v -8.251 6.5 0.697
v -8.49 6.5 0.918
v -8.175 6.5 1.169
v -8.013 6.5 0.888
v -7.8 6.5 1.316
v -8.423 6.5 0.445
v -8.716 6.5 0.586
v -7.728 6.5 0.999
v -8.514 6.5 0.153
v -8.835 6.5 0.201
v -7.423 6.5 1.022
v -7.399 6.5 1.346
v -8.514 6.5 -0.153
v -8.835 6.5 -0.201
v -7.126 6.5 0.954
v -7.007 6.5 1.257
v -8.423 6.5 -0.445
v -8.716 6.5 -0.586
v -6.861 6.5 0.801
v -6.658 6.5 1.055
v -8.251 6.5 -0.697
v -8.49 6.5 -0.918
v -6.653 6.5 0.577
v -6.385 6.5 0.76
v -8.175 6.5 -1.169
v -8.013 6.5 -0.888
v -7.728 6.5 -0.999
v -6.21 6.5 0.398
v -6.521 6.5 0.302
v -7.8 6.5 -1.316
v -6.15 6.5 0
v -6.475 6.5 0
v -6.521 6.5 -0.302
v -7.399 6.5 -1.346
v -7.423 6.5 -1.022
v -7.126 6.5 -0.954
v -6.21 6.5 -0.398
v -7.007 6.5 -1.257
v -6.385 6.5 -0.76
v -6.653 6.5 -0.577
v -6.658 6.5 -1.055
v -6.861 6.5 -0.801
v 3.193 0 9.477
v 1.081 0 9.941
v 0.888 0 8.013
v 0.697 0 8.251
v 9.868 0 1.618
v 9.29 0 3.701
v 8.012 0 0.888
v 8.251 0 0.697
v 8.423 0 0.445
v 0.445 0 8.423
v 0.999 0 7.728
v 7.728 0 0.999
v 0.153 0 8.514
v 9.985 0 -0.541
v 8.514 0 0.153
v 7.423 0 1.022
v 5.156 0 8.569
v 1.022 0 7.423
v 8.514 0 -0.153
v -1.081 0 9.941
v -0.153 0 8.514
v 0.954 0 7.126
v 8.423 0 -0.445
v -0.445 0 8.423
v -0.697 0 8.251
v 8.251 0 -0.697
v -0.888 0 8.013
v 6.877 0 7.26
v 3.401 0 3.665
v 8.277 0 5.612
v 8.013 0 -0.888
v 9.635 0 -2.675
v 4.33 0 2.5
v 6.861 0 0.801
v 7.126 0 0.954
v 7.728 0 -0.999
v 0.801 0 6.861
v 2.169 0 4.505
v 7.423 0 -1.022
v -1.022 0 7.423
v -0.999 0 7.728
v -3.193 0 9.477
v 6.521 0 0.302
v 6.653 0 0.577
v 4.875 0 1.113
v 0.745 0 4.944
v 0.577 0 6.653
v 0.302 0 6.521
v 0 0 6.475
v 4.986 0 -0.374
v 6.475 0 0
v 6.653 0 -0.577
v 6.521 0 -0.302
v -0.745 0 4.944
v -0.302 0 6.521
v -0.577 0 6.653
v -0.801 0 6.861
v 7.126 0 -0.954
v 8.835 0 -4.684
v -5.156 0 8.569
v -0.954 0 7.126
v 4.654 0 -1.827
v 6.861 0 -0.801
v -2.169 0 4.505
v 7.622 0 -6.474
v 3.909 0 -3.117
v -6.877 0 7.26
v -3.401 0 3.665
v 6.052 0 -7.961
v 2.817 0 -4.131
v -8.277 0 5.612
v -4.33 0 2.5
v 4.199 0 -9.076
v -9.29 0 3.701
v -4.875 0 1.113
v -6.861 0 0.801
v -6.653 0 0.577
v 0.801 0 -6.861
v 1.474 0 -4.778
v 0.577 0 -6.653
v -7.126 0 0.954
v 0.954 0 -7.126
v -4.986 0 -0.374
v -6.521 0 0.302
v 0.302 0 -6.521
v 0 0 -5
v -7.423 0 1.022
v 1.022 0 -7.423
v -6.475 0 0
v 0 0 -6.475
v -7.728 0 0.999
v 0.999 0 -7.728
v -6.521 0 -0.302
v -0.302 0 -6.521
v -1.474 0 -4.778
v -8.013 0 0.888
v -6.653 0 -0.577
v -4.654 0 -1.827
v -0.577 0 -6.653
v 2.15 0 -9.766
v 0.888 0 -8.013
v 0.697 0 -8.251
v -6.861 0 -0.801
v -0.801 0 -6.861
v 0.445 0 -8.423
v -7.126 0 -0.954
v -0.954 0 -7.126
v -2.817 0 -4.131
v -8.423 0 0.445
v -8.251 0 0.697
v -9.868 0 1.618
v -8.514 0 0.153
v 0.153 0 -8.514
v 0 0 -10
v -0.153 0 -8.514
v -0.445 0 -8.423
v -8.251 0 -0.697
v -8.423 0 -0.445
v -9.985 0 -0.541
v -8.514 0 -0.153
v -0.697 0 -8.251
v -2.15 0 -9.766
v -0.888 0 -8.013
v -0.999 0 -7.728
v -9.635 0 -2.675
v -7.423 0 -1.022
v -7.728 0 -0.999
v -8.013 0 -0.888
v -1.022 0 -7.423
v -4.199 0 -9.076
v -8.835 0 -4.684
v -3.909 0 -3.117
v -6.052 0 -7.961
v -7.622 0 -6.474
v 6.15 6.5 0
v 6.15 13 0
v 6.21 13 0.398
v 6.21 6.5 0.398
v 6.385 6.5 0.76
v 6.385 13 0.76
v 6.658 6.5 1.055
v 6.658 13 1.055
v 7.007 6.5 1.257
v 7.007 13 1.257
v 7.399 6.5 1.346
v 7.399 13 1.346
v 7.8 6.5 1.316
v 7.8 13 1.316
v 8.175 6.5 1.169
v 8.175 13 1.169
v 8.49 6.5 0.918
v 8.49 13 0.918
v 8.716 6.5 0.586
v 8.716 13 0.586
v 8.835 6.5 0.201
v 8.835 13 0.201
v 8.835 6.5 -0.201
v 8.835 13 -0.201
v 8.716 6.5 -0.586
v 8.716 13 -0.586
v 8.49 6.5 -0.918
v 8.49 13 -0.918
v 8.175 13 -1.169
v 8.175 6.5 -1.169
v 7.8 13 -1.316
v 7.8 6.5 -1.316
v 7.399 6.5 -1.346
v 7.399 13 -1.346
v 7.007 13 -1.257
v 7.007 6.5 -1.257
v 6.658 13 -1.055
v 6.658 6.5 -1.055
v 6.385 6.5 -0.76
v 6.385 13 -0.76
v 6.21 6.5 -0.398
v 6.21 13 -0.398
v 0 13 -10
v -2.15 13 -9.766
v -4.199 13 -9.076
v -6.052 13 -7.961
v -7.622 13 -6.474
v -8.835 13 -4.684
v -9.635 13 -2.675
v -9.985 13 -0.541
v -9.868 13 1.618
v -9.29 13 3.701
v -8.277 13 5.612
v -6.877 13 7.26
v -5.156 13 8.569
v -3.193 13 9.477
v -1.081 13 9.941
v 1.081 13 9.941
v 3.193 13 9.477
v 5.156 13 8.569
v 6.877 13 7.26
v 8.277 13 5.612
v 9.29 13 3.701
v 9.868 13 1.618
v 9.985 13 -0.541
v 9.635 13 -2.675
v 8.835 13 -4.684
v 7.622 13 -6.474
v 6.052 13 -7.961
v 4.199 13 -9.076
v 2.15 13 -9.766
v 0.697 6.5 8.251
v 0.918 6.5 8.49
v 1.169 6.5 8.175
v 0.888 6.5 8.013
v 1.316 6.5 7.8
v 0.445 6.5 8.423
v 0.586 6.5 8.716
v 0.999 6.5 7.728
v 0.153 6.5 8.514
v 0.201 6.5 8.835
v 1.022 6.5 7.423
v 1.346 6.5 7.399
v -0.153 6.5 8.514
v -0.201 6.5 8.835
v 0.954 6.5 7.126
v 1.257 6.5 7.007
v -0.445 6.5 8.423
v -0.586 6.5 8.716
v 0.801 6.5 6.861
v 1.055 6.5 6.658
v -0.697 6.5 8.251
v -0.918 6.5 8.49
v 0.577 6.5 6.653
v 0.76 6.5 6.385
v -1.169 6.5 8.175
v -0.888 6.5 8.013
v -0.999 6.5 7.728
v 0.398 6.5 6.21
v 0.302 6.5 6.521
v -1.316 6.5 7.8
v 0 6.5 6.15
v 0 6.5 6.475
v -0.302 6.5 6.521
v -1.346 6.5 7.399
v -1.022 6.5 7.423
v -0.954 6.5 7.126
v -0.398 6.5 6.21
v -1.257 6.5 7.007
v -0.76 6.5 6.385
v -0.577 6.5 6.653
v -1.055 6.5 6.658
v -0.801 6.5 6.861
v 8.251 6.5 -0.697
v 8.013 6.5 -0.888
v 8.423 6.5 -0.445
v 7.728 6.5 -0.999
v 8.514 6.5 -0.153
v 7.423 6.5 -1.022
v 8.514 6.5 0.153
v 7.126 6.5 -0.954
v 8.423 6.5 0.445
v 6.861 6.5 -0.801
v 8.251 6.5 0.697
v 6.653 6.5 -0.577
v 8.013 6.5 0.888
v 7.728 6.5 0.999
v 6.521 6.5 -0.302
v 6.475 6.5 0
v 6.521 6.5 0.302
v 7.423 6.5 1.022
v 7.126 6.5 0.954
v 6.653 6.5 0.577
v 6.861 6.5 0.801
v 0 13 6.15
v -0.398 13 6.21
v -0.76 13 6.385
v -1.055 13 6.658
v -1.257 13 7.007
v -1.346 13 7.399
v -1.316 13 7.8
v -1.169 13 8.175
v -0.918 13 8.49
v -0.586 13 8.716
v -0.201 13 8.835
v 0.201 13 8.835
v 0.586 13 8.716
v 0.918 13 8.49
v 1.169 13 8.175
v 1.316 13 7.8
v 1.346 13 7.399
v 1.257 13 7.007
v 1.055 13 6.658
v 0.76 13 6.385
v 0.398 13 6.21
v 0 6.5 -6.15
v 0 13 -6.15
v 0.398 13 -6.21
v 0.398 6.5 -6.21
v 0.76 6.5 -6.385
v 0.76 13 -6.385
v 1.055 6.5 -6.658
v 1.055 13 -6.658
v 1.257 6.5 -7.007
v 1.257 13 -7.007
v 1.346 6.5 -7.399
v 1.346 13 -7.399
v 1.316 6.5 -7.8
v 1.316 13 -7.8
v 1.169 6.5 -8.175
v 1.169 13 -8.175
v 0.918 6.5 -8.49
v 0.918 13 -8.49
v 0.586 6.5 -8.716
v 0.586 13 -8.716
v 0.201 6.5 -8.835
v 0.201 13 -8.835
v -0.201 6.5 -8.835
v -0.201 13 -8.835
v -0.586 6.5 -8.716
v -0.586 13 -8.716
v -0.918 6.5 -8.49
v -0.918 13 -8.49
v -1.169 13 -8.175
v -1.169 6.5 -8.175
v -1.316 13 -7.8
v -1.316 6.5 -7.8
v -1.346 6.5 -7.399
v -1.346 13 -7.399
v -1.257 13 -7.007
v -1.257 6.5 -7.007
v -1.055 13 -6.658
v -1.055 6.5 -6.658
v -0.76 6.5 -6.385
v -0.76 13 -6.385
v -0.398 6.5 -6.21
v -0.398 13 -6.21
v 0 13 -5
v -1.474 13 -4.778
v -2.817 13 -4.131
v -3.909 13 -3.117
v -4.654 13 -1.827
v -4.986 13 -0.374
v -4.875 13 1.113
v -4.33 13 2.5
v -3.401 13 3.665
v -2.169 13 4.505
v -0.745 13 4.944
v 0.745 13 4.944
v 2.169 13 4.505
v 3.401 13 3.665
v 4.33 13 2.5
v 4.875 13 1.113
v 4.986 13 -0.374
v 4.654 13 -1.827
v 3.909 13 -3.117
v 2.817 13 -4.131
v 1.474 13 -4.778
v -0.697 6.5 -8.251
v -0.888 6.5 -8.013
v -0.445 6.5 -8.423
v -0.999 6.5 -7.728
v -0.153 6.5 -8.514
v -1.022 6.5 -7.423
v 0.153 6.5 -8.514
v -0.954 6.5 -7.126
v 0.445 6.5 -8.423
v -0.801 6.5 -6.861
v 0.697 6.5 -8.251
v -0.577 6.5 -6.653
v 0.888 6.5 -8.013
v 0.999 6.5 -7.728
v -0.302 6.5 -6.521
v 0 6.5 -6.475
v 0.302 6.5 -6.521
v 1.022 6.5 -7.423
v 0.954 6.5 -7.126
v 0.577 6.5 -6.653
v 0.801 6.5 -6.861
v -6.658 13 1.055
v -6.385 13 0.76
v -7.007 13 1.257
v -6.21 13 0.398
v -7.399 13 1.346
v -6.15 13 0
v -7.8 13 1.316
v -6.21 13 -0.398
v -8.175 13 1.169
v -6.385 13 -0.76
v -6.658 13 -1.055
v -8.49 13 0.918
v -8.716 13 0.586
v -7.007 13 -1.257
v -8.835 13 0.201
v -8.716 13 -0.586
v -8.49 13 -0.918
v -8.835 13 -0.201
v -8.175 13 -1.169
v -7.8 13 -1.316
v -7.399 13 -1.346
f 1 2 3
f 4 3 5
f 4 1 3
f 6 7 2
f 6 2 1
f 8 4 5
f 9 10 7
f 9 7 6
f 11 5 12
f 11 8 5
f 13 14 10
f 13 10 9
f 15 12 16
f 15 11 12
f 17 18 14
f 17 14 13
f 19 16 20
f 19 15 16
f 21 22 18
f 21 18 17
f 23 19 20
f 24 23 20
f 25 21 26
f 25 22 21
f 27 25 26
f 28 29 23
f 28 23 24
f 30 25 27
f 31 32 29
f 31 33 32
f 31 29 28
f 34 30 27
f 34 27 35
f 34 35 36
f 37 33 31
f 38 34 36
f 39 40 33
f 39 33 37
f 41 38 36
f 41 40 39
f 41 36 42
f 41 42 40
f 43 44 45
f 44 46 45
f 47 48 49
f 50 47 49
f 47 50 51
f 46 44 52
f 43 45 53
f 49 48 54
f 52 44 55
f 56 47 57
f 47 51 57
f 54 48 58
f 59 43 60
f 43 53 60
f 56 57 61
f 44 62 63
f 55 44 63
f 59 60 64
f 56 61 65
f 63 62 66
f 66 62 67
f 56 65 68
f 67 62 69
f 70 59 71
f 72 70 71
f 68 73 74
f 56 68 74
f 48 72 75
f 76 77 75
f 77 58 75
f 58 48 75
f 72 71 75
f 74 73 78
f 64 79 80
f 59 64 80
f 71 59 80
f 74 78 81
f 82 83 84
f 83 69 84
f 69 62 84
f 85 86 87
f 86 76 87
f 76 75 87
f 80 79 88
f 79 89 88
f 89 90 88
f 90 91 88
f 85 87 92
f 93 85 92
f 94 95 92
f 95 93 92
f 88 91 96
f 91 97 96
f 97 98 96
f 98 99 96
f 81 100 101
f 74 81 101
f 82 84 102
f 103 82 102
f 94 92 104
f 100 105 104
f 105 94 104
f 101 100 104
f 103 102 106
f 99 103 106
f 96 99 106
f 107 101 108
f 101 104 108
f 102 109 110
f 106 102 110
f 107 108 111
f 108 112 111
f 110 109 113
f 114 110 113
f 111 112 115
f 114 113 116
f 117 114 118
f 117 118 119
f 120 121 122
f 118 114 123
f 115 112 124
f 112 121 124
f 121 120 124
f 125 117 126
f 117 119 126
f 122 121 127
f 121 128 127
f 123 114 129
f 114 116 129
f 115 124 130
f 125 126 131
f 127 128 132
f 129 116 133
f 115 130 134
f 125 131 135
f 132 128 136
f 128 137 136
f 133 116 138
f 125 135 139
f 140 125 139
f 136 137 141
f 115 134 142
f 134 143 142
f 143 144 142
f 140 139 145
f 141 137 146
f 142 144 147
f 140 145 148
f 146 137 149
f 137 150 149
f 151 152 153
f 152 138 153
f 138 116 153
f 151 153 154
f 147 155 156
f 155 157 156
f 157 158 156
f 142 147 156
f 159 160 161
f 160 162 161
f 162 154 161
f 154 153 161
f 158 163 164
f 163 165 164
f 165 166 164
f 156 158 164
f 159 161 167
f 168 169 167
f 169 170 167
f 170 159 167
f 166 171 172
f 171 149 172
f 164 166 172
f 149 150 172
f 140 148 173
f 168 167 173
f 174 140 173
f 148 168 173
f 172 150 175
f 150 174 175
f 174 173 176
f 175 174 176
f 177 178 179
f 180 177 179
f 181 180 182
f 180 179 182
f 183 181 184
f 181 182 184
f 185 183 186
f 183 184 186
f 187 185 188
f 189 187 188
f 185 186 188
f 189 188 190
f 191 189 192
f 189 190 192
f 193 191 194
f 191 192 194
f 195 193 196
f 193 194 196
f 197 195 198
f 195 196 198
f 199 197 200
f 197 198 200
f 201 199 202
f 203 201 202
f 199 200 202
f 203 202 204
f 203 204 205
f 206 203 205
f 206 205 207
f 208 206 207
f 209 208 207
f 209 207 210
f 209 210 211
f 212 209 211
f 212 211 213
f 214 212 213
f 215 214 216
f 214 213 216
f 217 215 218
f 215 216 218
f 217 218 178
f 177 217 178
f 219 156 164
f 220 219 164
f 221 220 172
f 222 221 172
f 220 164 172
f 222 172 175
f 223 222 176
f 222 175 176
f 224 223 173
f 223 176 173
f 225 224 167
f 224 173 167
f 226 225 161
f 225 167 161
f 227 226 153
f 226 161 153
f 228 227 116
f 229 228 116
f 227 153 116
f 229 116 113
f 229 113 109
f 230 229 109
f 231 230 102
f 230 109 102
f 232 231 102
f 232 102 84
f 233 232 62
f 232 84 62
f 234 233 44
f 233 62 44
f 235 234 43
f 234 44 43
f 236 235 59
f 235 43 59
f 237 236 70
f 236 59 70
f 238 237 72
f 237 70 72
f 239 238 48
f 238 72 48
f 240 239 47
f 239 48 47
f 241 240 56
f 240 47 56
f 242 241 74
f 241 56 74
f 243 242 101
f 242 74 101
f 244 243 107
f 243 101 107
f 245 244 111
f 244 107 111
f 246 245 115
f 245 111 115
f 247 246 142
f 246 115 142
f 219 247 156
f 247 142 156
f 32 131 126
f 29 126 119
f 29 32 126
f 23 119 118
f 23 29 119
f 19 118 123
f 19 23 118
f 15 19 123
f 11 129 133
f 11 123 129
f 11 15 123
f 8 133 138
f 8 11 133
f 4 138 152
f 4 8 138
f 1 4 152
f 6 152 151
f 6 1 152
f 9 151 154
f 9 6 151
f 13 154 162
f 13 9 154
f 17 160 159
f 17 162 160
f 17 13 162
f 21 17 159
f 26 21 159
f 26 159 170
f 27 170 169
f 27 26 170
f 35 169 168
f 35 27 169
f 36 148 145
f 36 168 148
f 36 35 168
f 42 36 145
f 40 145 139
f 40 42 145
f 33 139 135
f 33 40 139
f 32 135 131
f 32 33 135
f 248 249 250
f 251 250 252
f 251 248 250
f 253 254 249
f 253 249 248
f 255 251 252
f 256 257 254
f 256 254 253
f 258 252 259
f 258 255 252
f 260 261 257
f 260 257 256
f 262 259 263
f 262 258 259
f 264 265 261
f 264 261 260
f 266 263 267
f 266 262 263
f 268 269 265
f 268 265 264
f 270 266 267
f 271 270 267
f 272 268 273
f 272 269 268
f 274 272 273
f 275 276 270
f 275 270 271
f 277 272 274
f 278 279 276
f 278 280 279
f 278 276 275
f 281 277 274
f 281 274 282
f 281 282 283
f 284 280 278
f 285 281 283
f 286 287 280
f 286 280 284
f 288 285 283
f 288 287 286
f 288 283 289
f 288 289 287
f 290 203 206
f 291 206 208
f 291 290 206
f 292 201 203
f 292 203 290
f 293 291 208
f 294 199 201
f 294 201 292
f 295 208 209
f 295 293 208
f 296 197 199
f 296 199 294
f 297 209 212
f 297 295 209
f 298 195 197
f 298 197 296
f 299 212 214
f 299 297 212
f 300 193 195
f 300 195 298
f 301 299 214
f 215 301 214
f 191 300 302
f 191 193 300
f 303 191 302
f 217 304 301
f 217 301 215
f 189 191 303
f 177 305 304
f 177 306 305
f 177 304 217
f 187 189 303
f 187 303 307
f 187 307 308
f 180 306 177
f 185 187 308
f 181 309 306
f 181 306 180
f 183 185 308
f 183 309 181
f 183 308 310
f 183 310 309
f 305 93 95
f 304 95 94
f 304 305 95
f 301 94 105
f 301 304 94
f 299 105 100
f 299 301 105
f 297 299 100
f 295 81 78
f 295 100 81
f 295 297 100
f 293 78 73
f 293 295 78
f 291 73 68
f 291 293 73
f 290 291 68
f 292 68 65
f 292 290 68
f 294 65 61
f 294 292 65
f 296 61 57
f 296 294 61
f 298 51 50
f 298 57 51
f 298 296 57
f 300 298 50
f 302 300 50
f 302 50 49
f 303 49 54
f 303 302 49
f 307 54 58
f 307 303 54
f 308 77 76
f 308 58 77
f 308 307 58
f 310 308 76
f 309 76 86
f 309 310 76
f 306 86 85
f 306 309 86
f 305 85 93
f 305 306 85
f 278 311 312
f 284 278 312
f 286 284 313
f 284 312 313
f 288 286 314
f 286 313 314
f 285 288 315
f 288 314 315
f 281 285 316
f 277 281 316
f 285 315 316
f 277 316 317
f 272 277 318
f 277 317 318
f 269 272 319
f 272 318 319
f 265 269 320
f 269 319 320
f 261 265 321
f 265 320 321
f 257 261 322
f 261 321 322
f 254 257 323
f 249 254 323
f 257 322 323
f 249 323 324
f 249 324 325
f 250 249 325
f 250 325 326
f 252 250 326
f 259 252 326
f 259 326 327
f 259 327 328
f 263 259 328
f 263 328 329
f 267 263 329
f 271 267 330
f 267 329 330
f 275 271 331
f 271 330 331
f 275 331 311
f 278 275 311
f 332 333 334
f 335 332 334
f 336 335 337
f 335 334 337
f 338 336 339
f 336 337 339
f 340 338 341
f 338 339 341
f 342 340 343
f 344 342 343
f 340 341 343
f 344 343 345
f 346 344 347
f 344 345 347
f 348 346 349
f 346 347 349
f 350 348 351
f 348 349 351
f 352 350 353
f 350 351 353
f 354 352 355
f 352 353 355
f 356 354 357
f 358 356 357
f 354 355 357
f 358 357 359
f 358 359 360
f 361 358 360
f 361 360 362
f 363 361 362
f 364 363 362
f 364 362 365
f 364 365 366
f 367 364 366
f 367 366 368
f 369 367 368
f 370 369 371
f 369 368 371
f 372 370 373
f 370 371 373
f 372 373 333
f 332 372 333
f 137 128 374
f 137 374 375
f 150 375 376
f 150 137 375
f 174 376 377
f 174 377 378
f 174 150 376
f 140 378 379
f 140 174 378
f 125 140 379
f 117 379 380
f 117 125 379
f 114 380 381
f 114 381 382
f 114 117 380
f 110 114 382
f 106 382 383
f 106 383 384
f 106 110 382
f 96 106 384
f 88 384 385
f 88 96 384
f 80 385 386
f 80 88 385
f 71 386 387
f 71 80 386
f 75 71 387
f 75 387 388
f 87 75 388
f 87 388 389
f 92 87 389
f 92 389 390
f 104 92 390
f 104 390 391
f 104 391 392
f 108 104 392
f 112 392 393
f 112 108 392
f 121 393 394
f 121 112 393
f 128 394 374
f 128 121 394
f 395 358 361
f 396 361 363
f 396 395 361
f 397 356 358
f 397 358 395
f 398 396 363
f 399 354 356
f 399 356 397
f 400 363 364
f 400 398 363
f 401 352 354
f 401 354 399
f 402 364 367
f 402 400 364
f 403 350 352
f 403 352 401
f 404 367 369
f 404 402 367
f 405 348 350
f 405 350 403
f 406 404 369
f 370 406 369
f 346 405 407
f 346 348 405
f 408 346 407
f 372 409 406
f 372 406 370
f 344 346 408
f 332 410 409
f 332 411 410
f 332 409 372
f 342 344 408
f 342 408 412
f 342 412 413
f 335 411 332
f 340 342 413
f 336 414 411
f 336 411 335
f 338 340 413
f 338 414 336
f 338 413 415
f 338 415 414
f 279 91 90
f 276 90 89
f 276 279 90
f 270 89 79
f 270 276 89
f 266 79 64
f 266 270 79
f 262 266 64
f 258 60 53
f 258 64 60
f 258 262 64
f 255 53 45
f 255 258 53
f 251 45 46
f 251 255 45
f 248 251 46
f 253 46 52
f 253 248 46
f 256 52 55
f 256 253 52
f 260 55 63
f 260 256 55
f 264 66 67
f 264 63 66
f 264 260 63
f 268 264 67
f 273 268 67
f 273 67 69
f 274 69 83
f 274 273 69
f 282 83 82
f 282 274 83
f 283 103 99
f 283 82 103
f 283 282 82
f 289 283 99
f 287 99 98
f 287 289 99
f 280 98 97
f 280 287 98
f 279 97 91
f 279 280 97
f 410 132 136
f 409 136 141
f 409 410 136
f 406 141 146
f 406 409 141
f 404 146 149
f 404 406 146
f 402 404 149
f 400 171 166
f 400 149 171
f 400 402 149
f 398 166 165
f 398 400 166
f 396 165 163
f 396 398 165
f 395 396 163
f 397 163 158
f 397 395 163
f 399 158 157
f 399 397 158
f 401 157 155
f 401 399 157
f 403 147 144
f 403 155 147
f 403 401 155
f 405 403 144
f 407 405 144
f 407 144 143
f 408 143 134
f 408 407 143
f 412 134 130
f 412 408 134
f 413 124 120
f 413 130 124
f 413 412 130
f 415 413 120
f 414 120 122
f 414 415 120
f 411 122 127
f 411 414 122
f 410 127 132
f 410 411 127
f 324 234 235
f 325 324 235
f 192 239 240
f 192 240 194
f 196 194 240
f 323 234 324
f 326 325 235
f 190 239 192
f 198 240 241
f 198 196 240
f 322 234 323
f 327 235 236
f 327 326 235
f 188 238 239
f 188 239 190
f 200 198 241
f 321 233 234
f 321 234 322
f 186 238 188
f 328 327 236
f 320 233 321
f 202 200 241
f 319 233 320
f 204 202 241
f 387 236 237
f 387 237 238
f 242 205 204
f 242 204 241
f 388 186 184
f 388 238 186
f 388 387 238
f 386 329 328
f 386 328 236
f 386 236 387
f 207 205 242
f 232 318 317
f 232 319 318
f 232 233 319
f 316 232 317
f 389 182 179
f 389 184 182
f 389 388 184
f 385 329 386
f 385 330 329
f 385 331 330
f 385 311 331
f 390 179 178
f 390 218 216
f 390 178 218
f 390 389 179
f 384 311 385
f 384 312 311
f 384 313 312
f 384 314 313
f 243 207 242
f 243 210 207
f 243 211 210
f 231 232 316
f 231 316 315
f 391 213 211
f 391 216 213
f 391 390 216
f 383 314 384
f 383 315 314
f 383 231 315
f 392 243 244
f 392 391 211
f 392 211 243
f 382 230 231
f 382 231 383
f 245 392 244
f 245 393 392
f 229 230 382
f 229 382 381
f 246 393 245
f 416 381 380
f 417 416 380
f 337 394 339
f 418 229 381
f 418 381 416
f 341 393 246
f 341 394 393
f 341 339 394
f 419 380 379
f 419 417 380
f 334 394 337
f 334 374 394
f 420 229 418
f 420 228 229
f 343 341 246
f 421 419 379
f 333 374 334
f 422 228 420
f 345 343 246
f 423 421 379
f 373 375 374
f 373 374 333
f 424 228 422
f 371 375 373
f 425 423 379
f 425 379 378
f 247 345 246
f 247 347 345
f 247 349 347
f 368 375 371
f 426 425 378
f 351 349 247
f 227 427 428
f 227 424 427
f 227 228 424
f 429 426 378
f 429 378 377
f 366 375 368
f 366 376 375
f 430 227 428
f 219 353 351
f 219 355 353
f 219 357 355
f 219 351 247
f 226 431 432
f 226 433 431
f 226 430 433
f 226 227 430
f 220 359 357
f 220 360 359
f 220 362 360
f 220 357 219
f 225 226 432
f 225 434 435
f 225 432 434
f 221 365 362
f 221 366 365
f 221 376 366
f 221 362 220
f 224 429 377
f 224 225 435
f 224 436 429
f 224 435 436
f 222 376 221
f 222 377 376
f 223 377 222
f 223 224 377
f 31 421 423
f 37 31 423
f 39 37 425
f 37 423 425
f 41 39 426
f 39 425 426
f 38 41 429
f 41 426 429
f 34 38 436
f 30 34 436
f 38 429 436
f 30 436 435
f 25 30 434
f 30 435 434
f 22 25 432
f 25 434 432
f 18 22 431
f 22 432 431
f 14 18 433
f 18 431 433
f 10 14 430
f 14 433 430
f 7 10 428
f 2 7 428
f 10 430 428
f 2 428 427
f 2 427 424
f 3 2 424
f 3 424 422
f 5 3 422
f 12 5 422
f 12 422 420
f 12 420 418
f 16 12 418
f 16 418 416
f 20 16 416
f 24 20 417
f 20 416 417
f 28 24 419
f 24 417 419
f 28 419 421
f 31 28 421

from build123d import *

# Parameters (mm, degrees)
SKETCH_1_R               = 10
SKETCH_1_R_2             = 5
EXTRUDE_1_DEPTH          = 13
SKETCH_2_R               = 1.35
CUT_EXTRUDE_1_DEPTH      = 6.5
PATTERN_CIRCULAR_1_COUNT = 4


with BuildPart() as part:
    # 草图1 → 凸台-拉伸1 (new body)
    with BuildSketch(Plane(origin=(0, 0, 0), x_dir=(1, 0, 0), z_dir=(0, 1, 0))):
        with Locations(Location((0, 0, 0), (0, 0, 90))):
            Circle(SKETCH_1_R)
        with Locations(Location((0, 0, 0), (0, 0, 90))):
            Circle(SKETCH_1_R_2, mode=Mode.SUBTRACT)
    extrude(amount=EXTRUDE_1_DEPTH)

    # 草图2 → 切除-拉伸1 (cut)
    with BuildSketch(Plane(origin=(0, 13, 0), x_dir=(1, 0, 0), z_dir=(0, 1, 0))):
        with Locations(Location((0, 7.5, 0), (0, 0, 270))):
            Circle(SKETCH_2_R)
    cut_extrude_1 = extrude(amount=-CUT_EXTRUDE_1_DEPTH, mode=Mode.SUBTRACT)

    # 草图5 → M2.5 螺纹孔1 (revolve, cut)
    with BuildSketch(Plane(origin=(0, 6.5, -7.5), x_dir=(0, 0, 1), z_dir=(1, 0, 0))):
        Polygon((0, 0), (0, 27.865882135), (1.025, 27.25), (1.025, 0), align=None)
    hole_wizard_m2_5_1 = revolve(axis=Axis((0, 12.85, -7.5), (0, -1, 0)), mode=Mode.SUBTRACT)

    # 阵列(圆周)1: 切除-拉伸1, M2.5 螺纹孔1 ×4 about axis
    pattern_circular_1_axis = Axis((0, 0, 0), (0, 1, 0))
    add([cut_extrude_1.rotate(pattern_circular_1_axis, i * 360 / PATTERN_CIRCULAR_1_COUNT) for i in range(1, PATTERN_CIRCULAR_1_COUNT)], mode=Mode.SUBTRACT)
    add([hole_wizard_m2_5_1.rotate(pattern_circular_1_axis, i * 360 / PATTERN_CIRCULAR_1_COUNT) for i in range(1, PATTERN_CIRCULAR_1_COUNT)], mode=Mode.SUBTRACT)


solid = part.part
